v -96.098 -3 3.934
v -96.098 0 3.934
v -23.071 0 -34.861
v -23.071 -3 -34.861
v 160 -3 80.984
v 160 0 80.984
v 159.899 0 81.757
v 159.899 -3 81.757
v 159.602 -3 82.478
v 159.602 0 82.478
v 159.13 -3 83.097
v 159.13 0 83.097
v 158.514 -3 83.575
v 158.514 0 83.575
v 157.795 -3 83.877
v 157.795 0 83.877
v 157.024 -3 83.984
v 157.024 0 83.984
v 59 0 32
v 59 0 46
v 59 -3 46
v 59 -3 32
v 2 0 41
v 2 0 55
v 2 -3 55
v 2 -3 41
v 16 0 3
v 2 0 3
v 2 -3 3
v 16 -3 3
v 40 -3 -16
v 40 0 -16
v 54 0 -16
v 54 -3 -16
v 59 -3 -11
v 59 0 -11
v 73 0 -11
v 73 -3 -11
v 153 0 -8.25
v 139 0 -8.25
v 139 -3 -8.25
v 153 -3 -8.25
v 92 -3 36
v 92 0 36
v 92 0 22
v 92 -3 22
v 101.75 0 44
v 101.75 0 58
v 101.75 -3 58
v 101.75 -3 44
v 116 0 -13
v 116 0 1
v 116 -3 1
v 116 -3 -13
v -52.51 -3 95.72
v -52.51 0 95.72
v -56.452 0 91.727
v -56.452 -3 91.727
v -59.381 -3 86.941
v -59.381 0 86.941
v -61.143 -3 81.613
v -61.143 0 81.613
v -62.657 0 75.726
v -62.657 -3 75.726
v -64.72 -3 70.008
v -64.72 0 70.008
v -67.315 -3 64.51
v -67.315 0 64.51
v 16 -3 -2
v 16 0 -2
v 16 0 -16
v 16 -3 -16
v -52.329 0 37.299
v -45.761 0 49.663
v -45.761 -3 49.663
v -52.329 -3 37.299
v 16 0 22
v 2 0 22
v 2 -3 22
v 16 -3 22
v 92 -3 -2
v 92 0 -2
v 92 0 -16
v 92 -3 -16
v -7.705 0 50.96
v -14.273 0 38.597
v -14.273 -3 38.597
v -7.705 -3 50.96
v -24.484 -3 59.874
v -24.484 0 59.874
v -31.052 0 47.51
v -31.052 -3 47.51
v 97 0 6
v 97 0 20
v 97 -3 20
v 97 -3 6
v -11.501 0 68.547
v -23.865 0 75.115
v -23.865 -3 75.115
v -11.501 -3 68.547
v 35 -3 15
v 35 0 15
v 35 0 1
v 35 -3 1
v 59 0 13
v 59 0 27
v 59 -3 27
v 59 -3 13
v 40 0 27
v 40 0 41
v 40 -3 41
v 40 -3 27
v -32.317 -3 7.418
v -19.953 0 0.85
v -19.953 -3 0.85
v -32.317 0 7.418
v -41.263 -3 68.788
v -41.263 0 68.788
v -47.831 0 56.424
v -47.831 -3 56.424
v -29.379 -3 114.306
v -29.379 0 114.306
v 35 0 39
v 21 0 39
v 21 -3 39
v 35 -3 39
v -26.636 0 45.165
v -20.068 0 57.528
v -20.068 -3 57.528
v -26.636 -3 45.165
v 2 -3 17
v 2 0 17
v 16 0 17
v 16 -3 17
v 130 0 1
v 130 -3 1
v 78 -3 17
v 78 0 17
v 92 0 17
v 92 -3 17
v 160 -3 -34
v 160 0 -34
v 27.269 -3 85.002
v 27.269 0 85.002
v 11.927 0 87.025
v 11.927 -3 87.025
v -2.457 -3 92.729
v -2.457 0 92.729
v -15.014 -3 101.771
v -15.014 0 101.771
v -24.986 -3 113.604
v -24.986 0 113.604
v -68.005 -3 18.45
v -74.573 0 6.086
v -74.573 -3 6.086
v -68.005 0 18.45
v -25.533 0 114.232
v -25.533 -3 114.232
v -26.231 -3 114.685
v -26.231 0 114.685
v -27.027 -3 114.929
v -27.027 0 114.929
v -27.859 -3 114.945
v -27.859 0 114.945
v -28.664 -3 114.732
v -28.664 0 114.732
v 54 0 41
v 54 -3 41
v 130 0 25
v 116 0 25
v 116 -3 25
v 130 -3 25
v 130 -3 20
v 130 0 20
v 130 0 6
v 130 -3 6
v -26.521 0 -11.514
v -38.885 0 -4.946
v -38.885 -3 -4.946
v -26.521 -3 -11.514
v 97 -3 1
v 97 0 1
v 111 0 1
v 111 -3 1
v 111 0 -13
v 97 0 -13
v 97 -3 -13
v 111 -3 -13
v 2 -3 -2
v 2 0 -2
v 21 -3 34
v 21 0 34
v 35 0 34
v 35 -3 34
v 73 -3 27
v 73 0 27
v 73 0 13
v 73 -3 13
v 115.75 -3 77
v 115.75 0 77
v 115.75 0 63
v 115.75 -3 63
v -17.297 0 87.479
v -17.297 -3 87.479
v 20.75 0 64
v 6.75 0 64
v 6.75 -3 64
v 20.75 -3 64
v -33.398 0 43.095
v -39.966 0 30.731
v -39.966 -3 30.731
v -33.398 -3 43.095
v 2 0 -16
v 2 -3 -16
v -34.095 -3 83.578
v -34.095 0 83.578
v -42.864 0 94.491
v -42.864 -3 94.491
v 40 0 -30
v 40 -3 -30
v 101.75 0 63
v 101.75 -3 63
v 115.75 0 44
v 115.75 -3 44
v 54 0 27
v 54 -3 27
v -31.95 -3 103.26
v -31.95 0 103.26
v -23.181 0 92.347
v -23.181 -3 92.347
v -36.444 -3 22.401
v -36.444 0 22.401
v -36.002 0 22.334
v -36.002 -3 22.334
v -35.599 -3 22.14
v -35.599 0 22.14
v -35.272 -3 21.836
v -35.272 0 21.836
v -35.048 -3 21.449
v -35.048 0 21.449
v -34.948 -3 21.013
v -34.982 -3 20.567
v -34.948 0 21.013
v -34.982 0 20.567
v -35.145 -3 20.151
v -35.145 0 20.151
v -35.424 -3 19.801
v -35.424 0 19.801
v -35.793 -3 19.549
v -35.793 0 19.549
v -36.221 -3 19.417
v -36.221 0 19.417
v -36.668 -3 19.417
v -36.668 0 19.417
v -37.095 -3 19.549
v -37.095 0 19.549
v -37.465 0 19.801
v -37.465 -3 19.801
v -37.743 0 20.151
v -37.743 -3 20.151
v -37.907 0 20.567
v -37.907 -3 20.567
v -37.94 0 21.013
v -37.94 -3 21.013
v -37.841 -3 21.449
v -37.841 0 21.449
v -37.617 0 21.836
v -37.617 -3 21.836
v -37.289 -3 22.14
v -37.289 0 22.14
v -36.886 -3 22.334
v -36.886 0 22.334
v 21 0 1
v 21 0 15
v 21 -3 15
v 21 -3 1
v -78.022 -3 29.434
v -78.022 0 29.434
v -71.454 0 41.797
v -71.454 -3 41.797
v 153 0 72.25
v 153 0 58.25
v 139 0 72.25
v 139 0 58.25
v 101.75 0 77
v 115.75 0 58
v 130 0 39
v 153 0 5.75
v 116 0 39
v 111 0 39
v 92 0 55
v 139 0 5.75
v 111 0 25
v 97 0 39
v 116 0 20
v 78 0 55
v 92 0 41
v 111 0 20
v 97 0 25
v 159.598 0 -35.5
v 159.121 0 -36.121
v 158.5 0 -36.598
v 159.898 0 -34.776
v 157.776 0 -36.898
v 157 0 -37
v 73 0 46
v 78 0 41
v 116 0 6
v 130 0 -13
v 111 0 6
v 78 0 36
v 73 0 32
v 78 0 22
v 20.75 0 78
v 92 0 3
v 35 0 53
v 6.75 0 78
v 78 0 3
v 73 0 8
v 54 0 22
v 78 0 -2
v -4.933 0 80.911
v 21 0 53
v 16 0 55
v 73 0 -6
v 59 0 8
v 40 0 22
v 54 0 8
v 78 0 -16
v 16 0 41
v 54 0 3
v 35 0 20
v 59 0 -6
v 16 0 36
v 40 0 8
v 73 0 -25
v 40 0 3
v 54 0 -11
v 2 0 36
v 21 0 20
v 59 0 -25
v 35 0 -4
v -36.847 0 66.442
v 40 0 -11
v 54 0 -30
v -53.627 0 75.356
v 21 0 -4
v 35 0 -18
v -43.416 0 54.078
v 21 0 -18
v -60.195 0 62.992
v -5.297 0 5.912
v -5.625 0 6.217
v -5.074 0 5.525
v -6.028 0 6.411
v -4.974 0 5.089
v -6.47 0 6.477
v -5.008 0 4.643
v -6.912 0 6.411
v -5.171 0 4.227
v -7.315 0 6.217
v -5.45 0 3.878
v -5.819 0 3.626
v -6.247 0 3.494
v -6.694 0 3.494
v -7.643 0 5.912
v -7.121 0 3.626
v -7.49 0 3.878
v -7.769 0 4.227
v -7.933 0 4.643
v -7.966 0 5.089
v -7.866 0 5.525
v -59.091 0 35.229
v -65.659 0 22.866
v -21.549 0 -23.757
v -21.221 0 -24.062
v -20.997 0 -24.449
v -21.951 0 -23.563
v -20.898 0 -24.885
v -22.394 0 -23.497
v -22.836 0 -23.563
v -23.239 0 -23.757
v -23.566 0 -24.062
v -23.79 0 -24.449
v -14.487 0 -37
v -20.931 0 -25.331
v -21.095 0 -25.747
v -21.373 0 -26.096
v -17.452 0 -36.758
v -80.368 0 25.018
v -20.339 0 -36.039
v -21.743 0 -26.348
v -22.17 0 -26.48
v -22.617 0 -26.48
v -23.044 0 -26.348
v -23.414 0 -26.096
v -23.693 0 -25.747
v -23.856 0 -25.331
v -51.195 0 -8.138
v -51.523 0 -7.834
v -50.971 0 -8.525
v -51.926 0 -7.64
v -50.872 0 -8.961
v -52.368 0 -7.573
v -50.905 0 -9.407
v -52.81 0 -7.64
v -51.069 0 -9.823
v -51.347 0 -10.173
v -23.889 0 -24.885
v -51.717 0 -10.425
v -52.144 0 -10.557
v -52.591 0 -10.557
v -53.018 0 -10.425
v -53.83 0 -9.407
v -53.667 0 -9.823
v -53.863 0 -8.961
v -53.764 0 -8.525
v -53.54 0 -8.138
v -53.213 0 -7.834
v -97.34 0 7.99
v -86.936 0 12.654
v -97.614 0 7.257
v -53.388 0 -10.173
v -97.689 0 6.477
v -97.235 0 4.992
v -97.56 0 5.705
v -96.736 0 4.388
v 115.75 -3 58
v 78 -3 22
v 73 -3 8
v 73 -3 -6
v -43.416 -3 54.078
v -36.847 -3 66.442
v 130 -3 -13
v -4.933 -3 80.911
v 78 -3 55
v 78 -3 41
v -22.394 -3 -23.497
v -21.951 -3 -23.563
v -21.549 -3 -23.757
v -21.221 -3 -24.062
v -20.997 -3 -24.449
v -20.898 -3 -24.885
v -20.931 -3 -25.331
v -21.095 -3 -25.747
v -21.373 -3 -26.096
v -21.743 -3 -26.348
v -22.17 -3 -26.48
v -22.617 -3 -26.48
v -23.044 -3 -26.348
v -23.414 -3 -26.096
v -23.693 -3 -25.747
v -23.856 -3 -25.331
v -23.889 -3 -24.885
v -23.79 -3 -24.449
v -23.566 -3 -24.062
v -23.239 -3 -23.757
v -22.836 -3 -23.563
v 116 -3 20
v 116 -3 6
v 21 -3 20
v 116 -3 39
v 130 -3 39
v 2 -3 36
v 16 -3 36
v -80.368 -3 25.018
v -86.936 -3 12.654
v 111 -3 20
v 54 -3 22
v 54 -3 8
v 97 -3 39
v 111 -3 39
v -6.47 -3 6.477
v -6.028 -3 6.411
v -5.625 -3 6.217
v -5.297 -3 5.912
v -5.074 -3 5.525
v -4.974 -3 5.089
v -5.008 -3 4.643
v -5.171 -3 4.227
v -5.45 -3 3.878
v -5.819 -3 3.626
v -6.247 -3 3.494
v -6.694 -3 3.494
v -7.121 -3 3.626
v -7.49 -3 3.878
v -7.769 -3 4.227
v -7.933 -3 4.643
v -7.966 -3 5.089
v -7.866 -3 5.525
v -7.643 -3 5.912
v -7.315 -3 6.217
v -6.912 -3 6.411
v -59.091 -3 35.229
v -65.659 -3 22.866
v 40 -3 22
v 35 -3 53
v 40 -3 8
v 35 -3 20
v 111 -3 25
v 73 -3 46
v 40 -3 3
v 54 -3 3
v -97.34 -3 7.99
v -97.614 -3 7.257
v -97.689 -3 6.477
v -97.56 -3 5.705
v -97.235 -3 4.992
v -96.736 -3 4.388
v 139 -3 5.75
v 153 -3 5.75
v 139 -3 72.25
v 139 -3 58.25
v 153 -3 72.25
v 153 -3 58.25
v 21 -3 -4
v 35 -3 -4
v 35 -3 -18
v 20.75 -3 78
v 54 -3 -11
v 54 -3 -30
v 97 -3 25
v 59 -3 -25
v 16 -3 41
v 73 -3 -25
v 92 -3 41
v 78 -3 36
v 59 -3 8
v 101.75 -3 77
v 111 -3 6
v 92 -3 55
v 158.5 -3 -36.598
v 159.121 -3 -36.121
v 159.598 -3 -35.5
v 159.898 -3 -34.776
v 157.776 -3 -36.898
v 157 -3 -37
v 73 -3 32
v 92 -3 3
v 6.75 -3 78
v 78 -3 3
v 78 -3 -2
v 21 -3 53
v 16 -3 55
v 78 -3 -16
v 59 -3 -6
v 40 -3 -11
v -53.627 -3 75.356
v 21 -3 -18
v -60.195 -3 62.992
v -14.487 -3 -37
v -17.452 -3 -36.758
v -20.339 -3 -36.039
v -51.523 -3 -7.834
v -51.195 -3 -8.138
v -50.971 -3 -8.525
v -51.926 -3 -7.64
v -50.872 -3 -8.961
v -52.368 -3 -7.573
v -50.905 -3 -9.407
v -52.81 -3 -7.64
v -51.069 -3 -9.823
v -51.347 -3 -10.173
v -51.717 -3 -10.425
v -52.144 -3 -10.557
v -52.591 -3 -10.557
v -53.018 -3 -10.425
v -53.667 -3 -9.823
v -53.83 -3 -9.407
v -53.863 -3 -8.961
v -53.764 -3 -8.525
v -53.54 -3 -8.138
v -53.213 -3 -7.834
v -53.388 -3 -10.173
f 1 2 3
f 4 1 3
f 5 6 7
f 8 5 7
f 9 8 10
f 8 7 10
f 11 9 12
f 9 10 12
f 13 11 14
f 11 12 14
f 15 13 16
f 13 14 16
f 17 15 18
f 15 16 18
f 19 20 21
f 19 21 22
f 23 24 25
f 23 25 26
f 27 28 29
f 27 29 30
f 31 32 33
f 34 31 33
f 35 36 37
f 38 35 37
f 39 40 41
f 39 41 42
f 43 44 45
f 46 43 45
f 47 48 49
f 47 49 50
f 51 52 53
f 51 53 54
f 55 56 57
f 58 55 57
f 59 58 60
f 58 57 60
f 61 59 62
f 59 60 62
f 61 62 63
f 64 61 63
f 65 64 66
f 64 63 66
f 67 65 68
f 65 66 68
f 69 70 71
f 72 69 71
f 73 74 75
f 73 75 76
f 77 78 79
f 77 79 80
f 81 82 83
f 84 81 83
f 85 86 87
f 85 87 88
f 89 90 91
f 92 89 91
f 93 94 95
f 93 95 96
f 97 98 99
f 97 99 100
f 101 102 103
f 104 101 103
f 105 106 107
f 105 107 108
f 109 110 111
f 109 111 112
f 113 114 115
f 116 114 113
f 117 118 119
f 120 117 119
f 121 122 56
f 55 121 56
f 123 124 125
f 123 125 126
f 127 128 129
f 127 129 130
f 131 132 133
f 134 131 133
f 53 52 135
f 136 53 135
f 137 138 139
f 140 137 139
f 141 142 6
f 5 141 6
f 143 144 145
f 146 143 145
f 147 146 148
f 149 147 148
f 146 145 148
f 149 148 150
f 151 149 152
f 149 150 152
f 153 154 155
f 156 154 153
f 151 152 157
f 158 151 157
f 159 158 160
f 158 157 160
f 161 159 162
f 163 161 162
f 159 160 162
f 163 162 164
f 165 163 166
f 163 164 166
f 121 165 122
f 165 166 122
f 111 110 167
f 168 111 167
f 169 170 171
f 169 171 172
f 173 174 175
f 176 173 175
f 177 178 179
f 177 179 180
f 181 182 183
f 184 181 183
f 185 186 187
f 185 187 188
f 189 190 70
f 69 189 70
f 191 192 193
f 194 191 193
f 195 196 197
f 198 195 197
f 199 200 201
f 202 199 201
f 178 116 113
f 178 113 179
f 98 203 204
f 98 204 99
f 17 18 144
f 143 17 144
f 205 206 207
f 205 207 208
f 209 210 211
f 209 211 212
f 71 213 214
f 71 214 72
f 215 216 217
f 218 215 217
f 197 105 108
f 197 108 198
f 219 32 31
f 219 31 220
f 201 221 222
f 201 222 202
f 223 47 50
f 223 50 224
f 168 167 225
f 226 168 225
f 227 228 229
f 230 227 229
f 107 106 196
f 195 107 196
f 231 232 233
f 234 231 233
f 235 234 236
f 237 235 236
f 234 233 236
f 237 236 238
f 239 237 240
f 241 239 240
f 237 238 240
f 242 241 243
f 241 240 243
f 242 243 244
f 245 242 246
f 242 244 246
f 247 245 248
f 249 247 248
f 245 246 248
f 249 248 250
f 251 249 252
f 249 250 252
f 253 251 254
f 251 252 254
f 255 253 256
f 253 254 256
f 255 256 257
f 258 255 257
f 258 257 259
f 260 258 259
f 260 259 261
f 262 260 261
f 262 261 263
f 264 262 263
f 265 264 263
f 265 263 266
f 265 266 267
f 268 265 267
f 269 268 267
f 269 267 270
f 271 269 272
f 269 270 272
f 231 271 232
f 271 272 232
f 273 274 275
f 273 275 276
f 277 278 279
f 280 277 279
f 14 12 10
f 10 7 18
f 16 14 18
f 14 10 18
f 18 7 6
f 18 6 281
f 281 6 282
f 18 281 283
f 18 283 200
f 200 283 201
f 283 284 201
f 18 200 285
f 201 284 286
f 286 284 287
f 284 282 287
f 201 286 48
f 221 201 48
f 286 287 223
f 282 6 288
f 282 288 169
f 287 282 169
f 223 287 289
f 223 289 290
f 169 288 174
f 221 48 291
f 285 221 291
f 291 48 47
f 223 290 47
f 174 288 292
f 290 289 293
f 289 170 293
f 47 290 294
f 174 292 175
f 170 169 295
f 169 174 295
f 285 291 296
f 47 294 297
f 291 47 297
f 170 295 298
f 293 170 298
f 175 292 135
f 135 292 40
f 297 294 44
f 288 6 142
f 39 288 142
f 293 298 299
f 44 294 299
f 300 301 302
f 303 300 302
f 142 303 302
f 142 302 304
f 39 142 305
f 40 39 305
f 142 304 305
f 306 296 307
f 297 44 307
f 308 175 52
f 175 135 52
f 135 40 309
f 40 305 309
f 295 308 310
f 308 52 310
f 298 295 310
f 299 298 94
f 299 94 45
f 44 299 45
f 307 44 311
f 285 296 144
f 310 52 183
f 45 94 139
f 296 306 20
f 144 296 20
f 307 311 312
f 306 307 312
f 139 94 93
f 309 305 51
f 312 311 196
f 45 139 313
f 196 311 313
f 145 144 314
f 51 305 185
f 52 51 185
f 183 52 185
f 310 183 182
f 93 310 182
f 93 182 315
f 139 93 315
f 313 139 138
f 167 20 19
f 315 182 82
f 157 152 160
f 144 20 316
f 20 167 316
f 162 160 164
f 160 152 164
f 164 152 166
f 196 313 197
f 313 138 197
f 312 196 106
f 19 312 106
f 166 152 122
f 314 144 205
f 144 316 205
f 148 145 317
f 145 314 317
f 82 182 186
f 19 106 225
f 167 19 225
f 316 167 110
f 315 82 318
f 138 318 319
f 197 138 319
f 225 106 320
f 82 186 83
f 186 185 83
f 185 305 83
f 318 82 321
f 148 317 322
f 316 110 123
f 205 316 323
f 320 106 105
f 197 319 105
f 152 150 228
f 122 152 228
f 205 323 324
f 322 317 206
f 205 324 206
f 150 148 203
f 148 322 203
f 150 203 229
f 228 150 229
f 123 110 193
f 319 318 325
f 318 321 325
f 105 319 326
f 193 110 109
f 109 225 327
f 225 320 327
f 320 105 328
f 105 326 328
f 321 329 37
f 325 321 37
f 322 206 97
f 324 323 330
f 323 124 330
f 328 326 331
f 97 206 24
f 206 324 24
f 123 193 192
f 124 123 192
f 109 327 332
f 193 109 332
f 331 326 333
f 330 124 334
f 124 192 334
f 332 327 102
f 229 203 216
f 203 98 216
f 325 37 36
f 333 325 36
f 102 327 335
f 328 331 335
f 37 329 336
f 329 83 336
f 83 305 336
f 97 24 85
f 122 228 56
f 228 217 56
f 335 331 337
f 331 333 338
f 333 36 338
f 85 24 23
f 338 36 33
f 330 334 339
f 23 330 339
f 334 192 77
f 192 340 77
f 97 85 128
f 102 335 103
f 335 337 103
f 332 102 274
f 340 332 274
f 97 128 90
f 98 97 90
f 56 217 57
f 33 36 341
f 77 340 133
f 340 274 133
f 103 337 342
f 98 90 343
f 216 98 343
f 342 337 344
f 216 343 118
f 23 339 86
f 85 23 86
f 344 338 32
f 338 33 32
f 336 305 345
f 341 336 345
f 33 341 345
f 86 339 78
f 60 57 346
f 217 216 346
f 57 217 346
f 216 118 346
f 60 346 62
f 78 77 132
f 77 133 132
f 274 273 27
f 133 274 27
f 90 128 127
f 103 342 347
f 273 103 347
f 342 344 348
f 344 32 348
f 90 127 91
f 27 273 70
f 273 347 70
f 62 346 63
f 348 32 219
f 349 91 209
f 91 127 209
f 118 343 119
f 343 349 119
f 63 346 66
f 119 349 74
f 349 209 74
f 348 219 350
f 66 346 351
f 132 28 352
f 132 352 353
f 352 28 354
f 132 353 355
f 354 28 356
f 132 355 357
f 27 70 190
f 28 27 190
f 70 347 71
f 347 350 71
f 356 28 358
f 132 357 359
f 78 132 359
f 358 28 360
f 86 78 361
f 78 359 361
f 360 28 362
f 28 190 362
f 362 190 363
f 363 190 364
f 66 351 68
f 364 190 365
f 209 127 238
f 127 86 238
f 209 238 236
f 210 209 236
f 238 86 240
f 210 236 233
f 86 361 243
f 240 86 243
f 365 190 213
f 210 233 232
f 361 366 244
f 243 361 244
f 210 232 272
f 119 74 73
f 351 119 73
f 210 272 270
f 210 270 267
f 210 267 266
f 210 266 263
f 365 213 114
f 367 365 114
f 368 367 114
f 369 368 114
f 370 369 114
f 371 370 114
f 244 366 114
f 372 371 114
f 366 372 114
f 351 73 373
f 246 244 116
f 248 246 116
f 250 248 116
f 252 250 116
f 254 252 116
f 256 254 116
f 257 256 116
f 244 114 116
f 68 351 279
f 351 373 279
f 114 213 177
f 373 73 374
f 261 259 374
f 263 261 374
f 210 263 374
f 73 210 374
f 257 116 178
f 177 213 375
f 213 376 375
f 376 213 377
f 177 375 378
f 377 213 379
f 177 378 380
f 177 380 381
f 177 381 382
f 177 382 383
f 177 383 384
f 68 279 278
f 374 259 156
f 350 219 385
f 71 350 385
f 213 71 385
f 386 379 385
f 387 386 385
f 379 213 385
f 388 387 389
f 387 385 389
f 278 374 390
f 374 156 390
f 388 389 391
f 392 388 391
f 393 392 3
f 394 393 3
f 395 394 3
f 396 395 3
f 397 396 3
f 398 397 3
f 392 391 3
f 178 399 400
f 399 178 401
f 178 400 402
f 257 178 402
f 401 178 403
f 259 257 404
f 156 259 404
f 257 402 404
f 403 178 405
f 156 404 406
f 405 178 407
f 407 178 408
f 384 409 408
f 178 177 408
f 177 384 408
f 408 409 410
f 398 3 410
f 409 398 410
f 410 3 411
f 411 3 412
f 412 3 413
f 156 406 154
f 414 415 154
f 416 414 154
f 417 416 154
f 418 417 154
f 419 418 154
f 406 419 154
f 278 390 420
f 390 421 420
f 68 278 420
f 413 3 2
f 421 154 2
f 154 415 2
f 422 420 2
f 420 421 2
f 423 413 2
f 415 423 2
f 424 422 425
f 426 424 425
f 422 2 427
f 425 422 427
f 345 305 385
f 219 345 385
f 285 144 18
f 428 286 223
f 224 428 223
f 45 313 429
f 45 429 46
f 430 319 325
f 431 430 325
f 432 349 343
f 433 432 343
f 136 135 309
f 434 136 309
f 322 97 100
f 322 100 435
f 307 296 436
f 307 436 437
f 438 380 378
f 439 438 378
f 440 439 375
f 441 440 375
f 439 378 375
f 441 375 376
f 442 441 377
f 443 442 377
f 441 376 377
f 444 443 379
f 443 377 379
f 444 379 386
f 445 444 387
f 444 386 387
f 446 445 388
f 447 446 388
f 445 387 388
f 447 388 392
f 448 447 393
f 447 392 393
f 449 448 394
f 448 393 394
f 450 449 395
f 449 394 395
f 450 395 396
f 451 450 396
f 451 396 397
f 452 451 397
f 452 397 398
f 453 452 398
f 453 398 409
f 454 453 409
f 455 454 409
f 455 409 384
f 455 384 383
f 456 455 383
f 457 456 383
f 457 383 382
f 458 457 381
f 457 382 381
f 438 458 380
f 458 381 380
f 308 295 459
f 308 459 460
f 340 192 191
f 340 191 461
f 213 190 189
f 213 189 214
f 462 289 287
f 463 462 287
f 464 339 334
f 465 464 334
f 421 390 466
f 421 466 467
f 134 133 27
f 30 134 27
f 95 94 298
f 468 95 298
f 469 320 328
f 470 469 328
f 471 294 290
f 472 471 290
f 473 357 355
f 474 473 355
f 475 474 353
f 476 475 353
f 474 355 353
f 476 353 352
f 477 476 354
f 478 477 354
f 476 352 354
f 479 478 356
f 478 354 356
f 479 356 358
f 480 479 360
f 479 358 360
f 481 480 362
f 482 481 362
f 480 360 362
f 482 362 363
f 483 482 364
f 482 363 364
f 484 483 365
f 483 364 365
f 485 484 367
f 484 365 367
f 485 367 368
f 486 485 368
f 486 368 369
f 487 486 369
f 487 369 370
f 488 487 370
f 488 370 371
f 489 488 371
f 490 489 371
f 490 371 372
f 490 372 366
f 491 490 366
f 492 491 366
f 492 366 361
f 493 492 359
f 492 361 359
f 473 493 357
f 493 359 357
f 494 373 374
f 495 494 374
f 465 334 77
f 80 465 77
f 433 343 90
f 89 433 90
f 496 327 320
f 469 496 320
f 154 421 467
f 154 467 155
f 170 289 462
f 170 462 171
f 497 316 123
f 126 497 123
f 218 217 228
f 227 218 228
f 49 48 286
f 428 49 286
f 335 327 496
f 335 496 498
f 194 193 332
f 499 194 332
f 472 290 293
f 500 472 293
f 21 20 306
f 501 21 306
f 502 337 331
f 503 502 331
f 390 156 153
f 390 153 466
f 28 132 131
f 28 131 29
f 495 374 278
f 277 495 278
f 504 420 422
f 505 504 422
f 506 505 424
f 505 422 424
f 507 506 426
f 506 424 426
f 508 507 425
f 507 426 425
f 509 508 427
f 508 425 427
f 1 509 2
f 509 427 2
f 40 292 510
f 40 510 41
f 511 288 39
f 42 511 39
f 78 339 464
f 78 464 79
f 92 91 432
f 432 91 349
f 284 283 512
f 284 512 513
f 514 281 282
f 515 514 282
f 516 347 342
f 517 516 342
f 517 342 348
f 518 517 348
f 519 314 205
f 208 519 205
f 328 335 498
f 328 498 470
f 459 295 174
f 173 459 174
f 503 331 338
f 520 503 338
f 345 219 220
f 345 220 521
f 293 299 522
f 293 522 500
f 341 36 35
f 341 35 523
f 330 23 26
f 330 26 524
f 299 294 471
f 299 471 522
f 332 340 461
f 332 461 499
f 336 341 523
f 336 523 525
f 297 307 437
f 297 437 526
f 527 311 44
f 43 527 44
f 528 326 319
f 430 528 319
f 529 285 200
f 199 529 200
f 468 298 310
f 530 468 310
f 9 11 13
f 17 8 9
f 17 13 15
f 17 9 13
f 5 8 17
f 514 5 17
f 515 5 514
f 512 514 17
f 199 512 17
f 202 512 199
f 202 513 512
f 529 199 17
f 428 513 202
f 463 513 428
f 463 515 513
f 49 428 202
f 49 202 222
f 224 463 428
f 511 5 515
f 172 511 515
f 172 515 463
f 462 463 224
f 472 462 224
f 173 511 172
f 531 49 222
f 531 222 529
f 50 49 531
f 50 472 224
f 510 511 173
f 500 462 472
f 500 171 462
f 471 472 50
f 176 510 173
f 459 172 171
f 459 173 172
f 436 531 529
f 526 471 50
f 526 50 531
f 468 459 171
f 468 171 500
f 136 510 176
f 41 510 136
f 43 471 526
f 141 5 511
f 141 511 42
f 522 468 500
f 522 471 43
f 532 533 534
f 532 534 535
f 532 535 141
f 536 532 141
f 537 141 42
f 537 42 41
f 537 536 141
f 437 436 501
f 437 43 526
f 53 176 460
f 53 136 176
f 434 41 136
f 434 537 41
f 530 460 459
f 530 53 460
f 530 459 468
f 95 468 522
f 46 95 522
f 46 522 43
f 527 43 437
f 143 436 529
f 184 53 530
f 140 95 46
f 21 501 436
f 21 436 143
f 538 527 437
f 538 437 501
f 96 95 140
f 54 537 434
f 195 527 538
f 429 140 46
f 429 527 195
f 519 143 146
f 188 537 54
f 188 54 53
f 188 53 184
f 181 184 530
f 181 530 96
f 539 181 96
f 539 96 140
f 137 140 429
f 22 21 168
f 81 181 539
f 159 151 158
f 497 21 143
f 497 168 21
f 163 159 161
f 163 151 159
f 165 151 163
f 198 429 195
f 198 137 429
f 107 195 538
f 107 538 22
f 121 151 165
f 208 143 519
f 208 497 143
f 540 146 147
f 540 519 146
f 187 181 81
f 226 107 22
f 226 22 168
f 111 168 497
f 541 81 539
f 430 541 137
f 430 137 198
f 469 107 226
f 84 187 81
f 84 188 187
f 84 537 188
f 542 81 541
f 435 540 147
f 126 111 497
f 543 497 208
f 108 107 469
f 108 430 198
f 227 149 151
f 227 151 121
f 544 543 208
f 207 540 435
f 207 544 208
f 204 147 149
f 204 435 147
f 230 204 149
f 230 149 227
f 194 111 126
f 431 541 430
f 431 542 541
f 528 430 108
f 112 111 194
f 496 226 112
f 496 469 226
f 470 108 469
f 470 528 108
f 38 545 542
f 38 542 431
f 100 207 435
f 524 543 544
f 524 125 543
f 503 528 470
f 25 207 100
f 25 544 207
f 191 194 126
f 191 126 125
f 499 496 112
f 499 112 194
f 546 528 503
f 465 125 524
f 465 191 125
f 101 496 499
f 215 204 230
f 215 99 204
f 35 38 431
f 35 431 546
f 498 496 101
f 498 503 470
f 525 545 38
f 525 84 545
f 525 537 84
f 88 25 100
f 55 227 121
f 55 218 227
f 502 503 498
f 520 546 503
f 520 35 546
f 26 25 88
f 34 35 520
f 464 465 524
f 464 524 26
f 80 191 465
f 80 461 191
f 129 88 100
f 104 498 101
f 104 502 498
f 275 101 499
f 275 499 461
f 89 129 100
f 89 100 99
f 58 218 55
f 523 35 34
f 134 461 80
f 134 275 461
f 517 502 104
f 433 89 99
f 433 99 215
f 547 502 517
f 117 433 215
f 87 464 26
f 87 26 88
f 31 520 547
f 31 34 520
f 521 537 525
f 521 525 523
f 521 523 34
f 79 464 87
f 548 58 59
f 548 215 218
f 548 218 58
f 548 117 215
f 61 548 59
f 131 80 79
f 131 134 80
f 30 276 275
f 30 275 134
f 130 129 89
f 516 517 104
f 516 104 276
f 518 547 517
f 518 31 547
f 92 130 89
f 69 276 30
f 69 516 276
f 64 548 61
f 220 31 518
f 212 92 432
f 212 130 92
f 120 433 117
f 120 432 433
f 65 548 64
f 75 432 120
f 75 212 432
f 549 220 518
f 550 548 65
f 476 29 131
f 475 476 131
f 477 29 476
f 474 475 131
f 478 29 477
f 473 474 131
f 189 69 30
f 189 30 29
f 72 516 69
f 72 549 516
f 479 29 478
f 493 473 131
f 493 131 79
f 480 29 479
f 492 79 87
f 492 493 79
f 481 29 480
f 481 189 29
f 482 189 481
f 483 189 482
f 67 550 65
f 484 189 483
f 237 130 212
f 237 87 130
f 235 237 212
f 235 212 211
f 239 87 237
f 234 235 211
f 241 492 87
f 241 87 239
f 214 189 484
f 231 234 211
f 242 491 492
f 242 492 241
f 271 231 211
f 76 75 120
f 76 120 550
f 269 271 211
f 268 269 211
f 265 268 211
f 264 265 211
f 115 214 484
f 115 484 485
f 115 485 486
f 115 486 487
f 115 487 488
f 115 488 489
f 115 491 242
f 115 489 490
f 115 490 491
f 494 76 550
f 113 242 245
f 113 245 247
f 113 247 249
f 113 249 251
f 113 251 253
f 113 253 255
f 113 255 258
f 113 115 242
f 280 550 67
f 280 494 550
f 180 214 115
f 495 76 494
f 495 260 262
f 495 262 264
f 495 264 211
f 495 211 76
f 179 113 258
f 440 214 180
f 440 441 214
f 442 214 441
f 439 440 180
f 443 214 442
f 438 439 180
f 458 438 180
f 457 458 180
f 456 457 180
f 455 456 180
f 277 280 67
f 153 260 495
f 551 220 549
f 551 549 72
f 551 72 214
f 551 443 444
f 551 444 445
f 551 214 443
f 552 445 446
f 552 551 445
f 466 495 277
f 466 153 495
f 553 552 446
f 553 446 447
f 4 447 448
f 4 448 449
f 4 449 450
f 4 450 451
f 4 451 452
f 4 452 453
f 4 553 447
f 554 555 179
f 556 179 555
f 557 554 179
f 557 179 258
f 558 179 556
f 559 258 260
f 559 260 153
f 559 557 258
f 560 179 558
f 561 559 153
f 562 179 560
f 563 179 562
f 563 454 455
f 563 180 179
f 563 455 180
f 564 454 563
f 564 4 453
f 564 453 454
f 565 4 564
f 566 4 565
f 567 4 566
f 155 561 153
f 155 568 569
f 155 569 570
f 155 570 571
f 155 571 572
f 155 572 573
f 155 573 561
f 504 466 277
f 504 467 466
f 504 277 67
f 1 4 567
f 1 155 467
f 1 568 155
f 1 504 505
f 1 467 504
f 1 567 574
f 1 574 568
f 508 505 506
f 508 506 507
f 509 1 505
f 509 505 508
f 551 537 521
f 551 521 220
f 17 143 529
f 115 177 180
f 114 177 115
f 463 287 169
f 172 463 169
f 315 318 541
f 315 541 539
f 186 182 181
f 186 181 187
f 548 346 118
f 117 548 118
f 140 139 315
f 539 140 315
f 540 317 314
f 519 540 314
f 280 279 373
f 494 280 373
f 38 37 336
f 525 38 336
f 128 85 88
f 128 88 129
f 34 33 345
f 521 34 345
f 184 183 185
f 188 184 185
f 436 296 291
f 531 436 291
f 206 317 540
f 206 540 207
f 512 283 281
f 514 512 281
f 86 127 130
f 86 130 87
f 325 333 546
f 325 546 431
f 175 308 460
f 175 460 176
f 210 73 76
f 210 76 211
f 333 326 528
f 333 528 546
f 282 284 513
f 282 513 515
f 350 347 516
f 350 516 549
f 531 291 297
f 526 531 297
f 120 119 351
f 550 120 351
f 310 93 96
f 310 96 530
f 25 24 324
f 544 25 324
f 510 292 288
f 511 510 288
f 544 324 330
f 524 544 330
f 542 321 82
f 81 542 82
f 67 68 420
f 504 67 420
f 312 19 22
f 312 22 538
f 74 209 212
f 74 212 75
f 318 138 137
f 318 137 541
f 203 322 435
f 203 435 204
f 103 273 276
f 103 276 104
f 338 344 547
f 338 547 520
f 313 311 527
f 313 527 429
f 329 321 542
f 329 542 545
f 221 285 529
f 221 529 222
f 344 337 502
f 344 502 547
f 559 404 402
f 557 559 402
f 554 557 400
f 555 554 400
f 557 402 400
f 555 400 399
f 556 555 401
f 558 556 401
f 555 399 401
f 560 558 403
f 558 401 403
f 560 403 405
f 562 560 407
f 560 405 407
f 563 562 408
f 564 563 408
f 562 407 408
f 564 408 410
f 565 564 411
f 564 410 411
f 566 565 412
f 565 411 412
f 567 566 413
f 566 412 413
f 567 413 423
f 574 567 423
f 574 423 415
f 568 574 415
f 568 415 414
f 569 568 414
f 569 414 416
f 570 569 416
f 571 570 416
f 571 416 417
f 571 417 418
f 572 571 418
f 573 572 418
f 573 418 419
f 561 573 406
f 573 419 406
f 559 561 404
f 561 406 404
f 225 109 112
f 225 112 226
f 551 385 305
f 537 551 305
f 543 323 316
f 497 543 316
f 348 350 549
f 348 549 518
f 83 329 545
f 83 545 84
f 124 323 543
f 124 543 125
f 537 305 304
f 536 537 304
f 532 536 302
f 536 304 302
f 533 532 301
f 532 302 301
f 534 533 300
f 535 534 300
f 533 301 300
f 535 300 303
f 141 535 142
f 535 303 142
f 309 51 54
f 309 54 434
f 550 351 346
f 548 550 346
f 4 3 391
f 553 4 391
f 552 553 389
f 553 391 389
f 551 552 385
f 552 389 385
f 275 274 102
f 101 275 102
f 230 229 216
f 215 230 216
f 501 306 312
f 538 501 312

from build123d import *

# Parameters (mm, degrees)
SKETCH3_R   = 1.5
SKETCH3_W   = 14
SKETCH3_H   = 14
LASER_DEPTH = 3


with BuildPart() as part:
    # Sketch3 → Laser (new body)
    with BuildSketch(Plane(origin=(0, 0, 0), x_dir=(1, 0, 0), z_dir=(0, 1, 0))):
        with BuildLine():
            Line((-14.486734177, 37), (157, 37))
            ThreePointArc((157, 37), (159.121320344, 36.121320344), (160, 34))
            Line((160, 34), (160, -80.984375239))
            ThreePointArc((160, -80.984375239), (159.129622744, -83.097360561), (157.023528688, -83.984282971))
            Line((157.023528688, -83.984282971), (27.26862569, -85.001968485))
            ThreePointArc((27.26862569, -85.001968485), (-2.456705292, -92.729196832), (-24.985922812, -113.603576292))
            ThreePointArc((-24.985922812, -113.603576292), (-27.026813158, -114.929395936), (-29.379241112, -114.305606027))
            Line((-29.379241112, -114.305606027), (-52.510135606, -95.72030429))
            ThreePointArc((-52.510135606, -95.72030429), (-58.054538693, -89.41838891), (-61.142600429, -81.61336375))
            ThreePointArc((-61.142600429, -81.61336375), (-63.620659677, -72.842256523), (-67.314962408, -64.51007632))
            Line((-67.314962408, -64.51007632), (-97.34041061, -7.990411949))
            ThreePointArc((-97.34041061, -7.990411949), (-97.559643654, -5.704801569), (-96.098494227, -3.933609797))
            Line((-96.098494227, -3.933609797), (-23.071235452, 34.86131583))
            ThreePointArc((-23.071235452, 34.86131583), (-18.910183965, 36.457280449), (-14.486734177, 37))
        make_face()
        with Locations(Location((-22.393572022, 24.996840478, 0), (0, 0, 270))):
            Circle(SKETCH3_R, mode=Mode.SUBTRACT)
        with Locations(Location((-6.470173498, -4.977237981, 0), (0, 0, 270))):
            Circle(SKETCH3_R, mode=Mode.SUBTRACT)
        with Locations(Location((-36.444251957, -20.900636504, 0), (0, 0, 270))):
            Circle(SKETCH3_R, mode=Mode.SUBTRACT)
        with Locations(Location((-52.367650481, 9.073441955, 0), (0, 0, 270))):
            Circle(SKETCH3_R, mode=Mode.SUBTRACT)
        with Locations((9, -10)):
            Rectangle(SKETCH3_W, SKETCH3_H, mode=Mode.SUBTRACT)
        with Locations((9, 9)):
            Rectangle(SKETCH3_W, SKETCH3_H, mode=Mode.SUBTRACT)
        with Locations((28, 11)):
            Rectangle(SKETCH3_W, SKETCH3_H, mode=Mode.SUBTRACT)
        with Locations((47, 23)):
            Rectangle(SKETCH3_W, SKETCH3_H, mode=Mode.SUBTRACT)
        with Locations((66, 18)):
            Rectangle(SKETCH3_W, SKETCH3_H, mode=Mode.SUBTRACT)
        with Locations((85, 9)):
            Rectangle(SKETCH3_W, SKETCH3_H, mode=Mode.SUBTRACT)
        with Locations((104, 6)):
            Rectangle(SKETCH3_W, SKETCH3_H, mode=Mode.SUBTRACT)
        with Locations((123, 6)):
            Rectangle(SKETCH3_W, SKETCH3_H, mode=Mode.SUBTRACT)
        with Locations((146, 1.25)):
            Rectangle(SKETCH3_W, SKETCH3_H, mode=Mode.SUBTRACT)
        with Locations((146, -65.25)):
            Rectangle(SKETCH3_W, SKETCH3_H, mode=Mode.SUBTRACT)
        with Locations((28, -8)):
            Rectangle(SKETCH3_W, SKETCH3_H, mode=Mode.SUBTRACT)
        with Locations((47, 4)):
            Rectangle(SKETCH3_W, SKETCH3_H, mode=Mode.SUBTRACT)
        with Locations((66, -1)):
            Rectangle(SKETCH3_W, SKETCH3_H, mode=Mode.SUBTRACT)
        with Locations((85, -10)):
            Rectangle(SKETCH3_W, SKETCH3_H, mode=Mode.SUBTRACT)
        with Locations((104, -13)):
            Rectangle(SKETCH3_W, SKETCH3_H, mode=Mode.SUBTRACT)
        with Locations((123, -13)):
            Rectangle(SKETCH3_W, SKETCH3_H, mode=Mode.SUBTRACT)
        with Locations((9, -29)):
            Rectangle(SKETCH3_W, SKETCH3_H, mode=Mode.SUBTRACT)
        with Locations((28, -27)):
            Rectangle(SKETCH3_W, SKETCH3_H, mode=Mode.SUBTRACT)
        with Locations((47, -15)):
            Rectangle(SKETCH3_W, SKETCH3_H, mode=Mode.SUBTRACT)
        with Locations((66, -20)):
            Rectangle(SKETCH3_W, SKETCH3_H, mode=Mode.SUBTRACT)
        with Locations((85, -29)):
            Rectangle(SKETCH3_W, SKETCH3_H, mode=Mode.SUBTRACT)
        with Locations((104, -32)):
            Rectangle(SKETCH3_W, SKETCH3_H, mode=Mode.SUBTRACT)
        with Locations((123, -32)):
            Rectangle(SKETCH3_W, SKETCH3_H, mode=Mode.SUBTRACT)
        with Locations((9, -48)):
            Rectangle(SKETCH3_W, SKETCH3_H, mode=Mode.SUBTRACT)
        with Locations((28, -46)):
            Rectangle(SKETCH3_W, SKETCH3_H, mode=Mode.SUBTRACT)
        with Locations((47, -34)):
            Rectangle(SKETCH3_W, SKETCH3_H, mode=Mode.SUBTRACT)
        with Locations((66, -39)):
            Rectangle(SKETCH3_W, SKETCH3_H, mode=Mode.SUBTRACT)
        with Locations((85, -48)):
            Rectangle(SKETCH3_W, SKETCH3_H, mode=Mode.SUBTRACT)
        Polygon((-86.936243665, -12.654456356), (-74.572567085, -6.086389562), (-68.004500291, -18.450066143), (-80.368176871, -25.018132937), align=None, mode=Mode.SUBTRACT)
        with Locations((13.75, -71)):
            Rectangle(SKETCH3_W, SKETCH3_H, mode=Mode.SUBTRACT)
        with Locations((108.75, -51)):
            Rectangle(SKETCH3_W, SKETCH3_H, mode=Mode.SUBTRACT)
        with Locations((108.75, -70)):
            Rectangle(SKETCH3_W, SKETCH3_H, mode=Mode.SUBTRACT)
        Polygon((-65.65876215, -22.865664922), (-78.022438731, -29.433731716), (-71.454371937, -41.797408296), (-59.090695356, -35.229341502), align=None, mode=Mode.SUBTRACT)
        Polygon((-52.329358437, -37.29920214), (-39.965681856, -30.731135346), (-33.397615062, -43.094811927), (-45.761291642, -49.662878721), align=None, mode=Mode.SUBTRACT)
        Polygon((-26.636278142, -45.164672565), (-14.272601562, -38.596605771), (-7.704534768, -50.960282351), (-20.068211348, -57.528349145), align=None, mode=Mode.SUBTRACT)
        Polygon((-31.051876921, -47.510410705), (-43.415553502, -54.078477499), (-36.847486708, -66.44215408), (-24.483810127, -59.874087286), align=None, mode=Mode.SUBTRACT)
        Polygon((-47.831152281, -56.42421564), (-60.194828861, -62.992282434), (-53.626762067, -75.355959015), (-41.263085486, -68.787892221), align=None, mode=Mode.SUBTRACT)
        Polygon((-34.094882695, -83.577777362), (-42.863777875, -94.491368765), (-31.950186473, -103.260263946), (-23.181291292, -92.346672543), align=None, mode=Mode.SUBTRACT)
        Polygon((-23.864729376, -75.115009761), (-11.501052796, -68.546942967), (-4.932986002, -80.910619548), (-17.296662582, -87.478686342), align=None, mode=Mode.SUBTRACT)
        Polygon((-38.884783677, 4.94590688), (-26.521107096, 11.513973674), (-19.953040302, -0.849702906), (-32.316716883, -7.4177697), align=None, mode=Mode.SUBTRACT)
    extrude(amount=-LASER_DEPTH)


solid = part.part
